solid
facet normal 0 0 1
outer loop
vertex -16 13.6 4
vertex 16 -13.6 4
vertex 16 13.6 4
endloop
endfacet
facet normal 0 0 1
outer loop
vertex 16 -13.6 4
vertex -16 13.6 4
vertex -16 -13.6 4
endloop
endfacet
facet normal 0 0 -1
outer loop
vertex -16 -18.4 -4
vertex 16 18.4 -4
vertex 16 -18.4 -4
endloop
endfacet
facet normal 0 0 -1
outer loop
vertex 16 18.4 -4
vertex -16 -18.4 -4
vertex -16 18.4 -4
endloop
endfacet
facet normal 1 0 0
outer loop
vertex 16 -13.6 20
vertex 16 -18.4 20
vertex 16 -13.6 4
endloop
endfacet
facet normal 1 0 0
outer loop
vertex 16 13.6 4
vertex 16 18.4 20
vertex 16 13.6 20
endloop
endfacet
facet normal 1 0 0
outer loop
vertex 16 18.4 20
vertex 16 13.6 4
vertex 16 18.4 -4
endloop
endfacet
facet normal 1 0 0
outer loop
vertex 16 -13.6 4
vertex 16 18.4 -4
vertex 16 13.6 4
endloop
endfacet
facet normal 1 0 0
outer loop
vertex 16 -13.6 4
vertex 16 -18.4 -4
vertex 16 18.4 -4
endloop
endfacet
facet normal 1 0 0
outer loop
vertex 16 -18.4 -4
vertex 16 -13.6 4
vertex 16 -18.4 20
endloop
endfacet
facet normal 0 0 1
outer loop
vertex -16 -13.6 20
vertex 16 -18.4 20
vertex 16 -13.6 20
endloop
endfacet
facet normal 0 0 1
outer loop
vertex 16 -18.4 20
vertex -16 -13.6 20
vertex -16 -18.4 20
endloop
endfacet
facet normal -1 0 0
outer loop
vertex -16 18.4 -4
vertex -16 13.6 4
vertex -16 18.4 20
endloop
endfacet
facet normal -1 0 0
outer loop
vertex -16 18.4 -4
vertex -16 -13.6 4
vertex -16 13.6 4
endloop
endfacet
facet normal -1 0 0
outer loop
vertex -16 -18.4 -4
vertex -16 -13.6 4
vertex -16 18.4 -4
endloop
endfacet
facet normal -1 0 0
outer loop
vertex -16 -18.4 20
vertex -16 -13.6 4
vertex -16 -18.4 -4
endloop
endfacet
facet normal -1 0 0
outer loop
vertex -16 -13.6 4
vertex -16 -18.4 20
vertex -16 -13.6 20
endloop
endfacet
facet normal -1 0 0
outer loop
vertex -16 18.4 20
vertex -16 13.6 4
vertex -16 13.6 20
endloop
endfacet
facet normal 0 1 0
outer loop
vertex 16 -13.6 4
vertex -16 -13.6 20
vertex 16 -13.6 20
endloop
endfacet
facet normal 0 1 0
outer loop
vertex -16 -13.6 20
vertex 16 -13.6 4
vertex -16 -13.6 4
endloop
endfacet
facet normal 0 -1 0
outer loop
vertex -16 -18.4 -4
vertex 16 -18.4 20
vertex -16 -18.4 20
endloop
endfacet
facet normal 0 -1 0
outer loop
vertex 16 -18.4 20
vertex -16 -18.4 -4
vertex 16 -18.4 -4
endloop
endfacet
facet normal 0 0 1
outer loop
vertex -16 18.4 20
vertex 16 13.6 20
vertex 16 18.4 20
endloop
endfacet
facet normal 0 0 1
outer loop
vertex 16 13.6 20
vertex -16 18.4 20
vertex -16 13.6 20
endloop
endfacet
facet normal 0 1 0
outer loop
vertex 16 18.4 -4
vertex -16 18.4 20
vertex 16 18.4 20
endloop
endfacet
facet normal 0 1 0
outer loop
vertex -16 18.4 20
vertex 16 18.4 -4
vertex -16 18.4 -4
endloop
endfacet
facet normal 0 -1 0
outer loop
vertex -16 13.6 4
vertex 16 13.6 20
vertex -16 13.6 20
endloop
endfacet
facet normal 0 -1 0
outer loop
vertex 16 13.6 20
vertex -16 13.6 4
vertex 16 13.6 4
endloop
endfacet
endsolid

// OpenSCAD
size = 32;//block=32 //item=8


cube([size * 0.25, size * 1, size * 0.25], center = true);//handle

translate([0, -size * 0.5, size * 0.25]) {
  cube([size * 1, size * 0.15, size * 0.75], center = true);//left?
}
;
translate([0, size * 0.5, size * 0.25]) {
  cube([size * 1, size * 0.15, size * 0.75], center = true);//right?
}
;
cube([size * 1, size * 1, size * 0.25], center = true);//base
